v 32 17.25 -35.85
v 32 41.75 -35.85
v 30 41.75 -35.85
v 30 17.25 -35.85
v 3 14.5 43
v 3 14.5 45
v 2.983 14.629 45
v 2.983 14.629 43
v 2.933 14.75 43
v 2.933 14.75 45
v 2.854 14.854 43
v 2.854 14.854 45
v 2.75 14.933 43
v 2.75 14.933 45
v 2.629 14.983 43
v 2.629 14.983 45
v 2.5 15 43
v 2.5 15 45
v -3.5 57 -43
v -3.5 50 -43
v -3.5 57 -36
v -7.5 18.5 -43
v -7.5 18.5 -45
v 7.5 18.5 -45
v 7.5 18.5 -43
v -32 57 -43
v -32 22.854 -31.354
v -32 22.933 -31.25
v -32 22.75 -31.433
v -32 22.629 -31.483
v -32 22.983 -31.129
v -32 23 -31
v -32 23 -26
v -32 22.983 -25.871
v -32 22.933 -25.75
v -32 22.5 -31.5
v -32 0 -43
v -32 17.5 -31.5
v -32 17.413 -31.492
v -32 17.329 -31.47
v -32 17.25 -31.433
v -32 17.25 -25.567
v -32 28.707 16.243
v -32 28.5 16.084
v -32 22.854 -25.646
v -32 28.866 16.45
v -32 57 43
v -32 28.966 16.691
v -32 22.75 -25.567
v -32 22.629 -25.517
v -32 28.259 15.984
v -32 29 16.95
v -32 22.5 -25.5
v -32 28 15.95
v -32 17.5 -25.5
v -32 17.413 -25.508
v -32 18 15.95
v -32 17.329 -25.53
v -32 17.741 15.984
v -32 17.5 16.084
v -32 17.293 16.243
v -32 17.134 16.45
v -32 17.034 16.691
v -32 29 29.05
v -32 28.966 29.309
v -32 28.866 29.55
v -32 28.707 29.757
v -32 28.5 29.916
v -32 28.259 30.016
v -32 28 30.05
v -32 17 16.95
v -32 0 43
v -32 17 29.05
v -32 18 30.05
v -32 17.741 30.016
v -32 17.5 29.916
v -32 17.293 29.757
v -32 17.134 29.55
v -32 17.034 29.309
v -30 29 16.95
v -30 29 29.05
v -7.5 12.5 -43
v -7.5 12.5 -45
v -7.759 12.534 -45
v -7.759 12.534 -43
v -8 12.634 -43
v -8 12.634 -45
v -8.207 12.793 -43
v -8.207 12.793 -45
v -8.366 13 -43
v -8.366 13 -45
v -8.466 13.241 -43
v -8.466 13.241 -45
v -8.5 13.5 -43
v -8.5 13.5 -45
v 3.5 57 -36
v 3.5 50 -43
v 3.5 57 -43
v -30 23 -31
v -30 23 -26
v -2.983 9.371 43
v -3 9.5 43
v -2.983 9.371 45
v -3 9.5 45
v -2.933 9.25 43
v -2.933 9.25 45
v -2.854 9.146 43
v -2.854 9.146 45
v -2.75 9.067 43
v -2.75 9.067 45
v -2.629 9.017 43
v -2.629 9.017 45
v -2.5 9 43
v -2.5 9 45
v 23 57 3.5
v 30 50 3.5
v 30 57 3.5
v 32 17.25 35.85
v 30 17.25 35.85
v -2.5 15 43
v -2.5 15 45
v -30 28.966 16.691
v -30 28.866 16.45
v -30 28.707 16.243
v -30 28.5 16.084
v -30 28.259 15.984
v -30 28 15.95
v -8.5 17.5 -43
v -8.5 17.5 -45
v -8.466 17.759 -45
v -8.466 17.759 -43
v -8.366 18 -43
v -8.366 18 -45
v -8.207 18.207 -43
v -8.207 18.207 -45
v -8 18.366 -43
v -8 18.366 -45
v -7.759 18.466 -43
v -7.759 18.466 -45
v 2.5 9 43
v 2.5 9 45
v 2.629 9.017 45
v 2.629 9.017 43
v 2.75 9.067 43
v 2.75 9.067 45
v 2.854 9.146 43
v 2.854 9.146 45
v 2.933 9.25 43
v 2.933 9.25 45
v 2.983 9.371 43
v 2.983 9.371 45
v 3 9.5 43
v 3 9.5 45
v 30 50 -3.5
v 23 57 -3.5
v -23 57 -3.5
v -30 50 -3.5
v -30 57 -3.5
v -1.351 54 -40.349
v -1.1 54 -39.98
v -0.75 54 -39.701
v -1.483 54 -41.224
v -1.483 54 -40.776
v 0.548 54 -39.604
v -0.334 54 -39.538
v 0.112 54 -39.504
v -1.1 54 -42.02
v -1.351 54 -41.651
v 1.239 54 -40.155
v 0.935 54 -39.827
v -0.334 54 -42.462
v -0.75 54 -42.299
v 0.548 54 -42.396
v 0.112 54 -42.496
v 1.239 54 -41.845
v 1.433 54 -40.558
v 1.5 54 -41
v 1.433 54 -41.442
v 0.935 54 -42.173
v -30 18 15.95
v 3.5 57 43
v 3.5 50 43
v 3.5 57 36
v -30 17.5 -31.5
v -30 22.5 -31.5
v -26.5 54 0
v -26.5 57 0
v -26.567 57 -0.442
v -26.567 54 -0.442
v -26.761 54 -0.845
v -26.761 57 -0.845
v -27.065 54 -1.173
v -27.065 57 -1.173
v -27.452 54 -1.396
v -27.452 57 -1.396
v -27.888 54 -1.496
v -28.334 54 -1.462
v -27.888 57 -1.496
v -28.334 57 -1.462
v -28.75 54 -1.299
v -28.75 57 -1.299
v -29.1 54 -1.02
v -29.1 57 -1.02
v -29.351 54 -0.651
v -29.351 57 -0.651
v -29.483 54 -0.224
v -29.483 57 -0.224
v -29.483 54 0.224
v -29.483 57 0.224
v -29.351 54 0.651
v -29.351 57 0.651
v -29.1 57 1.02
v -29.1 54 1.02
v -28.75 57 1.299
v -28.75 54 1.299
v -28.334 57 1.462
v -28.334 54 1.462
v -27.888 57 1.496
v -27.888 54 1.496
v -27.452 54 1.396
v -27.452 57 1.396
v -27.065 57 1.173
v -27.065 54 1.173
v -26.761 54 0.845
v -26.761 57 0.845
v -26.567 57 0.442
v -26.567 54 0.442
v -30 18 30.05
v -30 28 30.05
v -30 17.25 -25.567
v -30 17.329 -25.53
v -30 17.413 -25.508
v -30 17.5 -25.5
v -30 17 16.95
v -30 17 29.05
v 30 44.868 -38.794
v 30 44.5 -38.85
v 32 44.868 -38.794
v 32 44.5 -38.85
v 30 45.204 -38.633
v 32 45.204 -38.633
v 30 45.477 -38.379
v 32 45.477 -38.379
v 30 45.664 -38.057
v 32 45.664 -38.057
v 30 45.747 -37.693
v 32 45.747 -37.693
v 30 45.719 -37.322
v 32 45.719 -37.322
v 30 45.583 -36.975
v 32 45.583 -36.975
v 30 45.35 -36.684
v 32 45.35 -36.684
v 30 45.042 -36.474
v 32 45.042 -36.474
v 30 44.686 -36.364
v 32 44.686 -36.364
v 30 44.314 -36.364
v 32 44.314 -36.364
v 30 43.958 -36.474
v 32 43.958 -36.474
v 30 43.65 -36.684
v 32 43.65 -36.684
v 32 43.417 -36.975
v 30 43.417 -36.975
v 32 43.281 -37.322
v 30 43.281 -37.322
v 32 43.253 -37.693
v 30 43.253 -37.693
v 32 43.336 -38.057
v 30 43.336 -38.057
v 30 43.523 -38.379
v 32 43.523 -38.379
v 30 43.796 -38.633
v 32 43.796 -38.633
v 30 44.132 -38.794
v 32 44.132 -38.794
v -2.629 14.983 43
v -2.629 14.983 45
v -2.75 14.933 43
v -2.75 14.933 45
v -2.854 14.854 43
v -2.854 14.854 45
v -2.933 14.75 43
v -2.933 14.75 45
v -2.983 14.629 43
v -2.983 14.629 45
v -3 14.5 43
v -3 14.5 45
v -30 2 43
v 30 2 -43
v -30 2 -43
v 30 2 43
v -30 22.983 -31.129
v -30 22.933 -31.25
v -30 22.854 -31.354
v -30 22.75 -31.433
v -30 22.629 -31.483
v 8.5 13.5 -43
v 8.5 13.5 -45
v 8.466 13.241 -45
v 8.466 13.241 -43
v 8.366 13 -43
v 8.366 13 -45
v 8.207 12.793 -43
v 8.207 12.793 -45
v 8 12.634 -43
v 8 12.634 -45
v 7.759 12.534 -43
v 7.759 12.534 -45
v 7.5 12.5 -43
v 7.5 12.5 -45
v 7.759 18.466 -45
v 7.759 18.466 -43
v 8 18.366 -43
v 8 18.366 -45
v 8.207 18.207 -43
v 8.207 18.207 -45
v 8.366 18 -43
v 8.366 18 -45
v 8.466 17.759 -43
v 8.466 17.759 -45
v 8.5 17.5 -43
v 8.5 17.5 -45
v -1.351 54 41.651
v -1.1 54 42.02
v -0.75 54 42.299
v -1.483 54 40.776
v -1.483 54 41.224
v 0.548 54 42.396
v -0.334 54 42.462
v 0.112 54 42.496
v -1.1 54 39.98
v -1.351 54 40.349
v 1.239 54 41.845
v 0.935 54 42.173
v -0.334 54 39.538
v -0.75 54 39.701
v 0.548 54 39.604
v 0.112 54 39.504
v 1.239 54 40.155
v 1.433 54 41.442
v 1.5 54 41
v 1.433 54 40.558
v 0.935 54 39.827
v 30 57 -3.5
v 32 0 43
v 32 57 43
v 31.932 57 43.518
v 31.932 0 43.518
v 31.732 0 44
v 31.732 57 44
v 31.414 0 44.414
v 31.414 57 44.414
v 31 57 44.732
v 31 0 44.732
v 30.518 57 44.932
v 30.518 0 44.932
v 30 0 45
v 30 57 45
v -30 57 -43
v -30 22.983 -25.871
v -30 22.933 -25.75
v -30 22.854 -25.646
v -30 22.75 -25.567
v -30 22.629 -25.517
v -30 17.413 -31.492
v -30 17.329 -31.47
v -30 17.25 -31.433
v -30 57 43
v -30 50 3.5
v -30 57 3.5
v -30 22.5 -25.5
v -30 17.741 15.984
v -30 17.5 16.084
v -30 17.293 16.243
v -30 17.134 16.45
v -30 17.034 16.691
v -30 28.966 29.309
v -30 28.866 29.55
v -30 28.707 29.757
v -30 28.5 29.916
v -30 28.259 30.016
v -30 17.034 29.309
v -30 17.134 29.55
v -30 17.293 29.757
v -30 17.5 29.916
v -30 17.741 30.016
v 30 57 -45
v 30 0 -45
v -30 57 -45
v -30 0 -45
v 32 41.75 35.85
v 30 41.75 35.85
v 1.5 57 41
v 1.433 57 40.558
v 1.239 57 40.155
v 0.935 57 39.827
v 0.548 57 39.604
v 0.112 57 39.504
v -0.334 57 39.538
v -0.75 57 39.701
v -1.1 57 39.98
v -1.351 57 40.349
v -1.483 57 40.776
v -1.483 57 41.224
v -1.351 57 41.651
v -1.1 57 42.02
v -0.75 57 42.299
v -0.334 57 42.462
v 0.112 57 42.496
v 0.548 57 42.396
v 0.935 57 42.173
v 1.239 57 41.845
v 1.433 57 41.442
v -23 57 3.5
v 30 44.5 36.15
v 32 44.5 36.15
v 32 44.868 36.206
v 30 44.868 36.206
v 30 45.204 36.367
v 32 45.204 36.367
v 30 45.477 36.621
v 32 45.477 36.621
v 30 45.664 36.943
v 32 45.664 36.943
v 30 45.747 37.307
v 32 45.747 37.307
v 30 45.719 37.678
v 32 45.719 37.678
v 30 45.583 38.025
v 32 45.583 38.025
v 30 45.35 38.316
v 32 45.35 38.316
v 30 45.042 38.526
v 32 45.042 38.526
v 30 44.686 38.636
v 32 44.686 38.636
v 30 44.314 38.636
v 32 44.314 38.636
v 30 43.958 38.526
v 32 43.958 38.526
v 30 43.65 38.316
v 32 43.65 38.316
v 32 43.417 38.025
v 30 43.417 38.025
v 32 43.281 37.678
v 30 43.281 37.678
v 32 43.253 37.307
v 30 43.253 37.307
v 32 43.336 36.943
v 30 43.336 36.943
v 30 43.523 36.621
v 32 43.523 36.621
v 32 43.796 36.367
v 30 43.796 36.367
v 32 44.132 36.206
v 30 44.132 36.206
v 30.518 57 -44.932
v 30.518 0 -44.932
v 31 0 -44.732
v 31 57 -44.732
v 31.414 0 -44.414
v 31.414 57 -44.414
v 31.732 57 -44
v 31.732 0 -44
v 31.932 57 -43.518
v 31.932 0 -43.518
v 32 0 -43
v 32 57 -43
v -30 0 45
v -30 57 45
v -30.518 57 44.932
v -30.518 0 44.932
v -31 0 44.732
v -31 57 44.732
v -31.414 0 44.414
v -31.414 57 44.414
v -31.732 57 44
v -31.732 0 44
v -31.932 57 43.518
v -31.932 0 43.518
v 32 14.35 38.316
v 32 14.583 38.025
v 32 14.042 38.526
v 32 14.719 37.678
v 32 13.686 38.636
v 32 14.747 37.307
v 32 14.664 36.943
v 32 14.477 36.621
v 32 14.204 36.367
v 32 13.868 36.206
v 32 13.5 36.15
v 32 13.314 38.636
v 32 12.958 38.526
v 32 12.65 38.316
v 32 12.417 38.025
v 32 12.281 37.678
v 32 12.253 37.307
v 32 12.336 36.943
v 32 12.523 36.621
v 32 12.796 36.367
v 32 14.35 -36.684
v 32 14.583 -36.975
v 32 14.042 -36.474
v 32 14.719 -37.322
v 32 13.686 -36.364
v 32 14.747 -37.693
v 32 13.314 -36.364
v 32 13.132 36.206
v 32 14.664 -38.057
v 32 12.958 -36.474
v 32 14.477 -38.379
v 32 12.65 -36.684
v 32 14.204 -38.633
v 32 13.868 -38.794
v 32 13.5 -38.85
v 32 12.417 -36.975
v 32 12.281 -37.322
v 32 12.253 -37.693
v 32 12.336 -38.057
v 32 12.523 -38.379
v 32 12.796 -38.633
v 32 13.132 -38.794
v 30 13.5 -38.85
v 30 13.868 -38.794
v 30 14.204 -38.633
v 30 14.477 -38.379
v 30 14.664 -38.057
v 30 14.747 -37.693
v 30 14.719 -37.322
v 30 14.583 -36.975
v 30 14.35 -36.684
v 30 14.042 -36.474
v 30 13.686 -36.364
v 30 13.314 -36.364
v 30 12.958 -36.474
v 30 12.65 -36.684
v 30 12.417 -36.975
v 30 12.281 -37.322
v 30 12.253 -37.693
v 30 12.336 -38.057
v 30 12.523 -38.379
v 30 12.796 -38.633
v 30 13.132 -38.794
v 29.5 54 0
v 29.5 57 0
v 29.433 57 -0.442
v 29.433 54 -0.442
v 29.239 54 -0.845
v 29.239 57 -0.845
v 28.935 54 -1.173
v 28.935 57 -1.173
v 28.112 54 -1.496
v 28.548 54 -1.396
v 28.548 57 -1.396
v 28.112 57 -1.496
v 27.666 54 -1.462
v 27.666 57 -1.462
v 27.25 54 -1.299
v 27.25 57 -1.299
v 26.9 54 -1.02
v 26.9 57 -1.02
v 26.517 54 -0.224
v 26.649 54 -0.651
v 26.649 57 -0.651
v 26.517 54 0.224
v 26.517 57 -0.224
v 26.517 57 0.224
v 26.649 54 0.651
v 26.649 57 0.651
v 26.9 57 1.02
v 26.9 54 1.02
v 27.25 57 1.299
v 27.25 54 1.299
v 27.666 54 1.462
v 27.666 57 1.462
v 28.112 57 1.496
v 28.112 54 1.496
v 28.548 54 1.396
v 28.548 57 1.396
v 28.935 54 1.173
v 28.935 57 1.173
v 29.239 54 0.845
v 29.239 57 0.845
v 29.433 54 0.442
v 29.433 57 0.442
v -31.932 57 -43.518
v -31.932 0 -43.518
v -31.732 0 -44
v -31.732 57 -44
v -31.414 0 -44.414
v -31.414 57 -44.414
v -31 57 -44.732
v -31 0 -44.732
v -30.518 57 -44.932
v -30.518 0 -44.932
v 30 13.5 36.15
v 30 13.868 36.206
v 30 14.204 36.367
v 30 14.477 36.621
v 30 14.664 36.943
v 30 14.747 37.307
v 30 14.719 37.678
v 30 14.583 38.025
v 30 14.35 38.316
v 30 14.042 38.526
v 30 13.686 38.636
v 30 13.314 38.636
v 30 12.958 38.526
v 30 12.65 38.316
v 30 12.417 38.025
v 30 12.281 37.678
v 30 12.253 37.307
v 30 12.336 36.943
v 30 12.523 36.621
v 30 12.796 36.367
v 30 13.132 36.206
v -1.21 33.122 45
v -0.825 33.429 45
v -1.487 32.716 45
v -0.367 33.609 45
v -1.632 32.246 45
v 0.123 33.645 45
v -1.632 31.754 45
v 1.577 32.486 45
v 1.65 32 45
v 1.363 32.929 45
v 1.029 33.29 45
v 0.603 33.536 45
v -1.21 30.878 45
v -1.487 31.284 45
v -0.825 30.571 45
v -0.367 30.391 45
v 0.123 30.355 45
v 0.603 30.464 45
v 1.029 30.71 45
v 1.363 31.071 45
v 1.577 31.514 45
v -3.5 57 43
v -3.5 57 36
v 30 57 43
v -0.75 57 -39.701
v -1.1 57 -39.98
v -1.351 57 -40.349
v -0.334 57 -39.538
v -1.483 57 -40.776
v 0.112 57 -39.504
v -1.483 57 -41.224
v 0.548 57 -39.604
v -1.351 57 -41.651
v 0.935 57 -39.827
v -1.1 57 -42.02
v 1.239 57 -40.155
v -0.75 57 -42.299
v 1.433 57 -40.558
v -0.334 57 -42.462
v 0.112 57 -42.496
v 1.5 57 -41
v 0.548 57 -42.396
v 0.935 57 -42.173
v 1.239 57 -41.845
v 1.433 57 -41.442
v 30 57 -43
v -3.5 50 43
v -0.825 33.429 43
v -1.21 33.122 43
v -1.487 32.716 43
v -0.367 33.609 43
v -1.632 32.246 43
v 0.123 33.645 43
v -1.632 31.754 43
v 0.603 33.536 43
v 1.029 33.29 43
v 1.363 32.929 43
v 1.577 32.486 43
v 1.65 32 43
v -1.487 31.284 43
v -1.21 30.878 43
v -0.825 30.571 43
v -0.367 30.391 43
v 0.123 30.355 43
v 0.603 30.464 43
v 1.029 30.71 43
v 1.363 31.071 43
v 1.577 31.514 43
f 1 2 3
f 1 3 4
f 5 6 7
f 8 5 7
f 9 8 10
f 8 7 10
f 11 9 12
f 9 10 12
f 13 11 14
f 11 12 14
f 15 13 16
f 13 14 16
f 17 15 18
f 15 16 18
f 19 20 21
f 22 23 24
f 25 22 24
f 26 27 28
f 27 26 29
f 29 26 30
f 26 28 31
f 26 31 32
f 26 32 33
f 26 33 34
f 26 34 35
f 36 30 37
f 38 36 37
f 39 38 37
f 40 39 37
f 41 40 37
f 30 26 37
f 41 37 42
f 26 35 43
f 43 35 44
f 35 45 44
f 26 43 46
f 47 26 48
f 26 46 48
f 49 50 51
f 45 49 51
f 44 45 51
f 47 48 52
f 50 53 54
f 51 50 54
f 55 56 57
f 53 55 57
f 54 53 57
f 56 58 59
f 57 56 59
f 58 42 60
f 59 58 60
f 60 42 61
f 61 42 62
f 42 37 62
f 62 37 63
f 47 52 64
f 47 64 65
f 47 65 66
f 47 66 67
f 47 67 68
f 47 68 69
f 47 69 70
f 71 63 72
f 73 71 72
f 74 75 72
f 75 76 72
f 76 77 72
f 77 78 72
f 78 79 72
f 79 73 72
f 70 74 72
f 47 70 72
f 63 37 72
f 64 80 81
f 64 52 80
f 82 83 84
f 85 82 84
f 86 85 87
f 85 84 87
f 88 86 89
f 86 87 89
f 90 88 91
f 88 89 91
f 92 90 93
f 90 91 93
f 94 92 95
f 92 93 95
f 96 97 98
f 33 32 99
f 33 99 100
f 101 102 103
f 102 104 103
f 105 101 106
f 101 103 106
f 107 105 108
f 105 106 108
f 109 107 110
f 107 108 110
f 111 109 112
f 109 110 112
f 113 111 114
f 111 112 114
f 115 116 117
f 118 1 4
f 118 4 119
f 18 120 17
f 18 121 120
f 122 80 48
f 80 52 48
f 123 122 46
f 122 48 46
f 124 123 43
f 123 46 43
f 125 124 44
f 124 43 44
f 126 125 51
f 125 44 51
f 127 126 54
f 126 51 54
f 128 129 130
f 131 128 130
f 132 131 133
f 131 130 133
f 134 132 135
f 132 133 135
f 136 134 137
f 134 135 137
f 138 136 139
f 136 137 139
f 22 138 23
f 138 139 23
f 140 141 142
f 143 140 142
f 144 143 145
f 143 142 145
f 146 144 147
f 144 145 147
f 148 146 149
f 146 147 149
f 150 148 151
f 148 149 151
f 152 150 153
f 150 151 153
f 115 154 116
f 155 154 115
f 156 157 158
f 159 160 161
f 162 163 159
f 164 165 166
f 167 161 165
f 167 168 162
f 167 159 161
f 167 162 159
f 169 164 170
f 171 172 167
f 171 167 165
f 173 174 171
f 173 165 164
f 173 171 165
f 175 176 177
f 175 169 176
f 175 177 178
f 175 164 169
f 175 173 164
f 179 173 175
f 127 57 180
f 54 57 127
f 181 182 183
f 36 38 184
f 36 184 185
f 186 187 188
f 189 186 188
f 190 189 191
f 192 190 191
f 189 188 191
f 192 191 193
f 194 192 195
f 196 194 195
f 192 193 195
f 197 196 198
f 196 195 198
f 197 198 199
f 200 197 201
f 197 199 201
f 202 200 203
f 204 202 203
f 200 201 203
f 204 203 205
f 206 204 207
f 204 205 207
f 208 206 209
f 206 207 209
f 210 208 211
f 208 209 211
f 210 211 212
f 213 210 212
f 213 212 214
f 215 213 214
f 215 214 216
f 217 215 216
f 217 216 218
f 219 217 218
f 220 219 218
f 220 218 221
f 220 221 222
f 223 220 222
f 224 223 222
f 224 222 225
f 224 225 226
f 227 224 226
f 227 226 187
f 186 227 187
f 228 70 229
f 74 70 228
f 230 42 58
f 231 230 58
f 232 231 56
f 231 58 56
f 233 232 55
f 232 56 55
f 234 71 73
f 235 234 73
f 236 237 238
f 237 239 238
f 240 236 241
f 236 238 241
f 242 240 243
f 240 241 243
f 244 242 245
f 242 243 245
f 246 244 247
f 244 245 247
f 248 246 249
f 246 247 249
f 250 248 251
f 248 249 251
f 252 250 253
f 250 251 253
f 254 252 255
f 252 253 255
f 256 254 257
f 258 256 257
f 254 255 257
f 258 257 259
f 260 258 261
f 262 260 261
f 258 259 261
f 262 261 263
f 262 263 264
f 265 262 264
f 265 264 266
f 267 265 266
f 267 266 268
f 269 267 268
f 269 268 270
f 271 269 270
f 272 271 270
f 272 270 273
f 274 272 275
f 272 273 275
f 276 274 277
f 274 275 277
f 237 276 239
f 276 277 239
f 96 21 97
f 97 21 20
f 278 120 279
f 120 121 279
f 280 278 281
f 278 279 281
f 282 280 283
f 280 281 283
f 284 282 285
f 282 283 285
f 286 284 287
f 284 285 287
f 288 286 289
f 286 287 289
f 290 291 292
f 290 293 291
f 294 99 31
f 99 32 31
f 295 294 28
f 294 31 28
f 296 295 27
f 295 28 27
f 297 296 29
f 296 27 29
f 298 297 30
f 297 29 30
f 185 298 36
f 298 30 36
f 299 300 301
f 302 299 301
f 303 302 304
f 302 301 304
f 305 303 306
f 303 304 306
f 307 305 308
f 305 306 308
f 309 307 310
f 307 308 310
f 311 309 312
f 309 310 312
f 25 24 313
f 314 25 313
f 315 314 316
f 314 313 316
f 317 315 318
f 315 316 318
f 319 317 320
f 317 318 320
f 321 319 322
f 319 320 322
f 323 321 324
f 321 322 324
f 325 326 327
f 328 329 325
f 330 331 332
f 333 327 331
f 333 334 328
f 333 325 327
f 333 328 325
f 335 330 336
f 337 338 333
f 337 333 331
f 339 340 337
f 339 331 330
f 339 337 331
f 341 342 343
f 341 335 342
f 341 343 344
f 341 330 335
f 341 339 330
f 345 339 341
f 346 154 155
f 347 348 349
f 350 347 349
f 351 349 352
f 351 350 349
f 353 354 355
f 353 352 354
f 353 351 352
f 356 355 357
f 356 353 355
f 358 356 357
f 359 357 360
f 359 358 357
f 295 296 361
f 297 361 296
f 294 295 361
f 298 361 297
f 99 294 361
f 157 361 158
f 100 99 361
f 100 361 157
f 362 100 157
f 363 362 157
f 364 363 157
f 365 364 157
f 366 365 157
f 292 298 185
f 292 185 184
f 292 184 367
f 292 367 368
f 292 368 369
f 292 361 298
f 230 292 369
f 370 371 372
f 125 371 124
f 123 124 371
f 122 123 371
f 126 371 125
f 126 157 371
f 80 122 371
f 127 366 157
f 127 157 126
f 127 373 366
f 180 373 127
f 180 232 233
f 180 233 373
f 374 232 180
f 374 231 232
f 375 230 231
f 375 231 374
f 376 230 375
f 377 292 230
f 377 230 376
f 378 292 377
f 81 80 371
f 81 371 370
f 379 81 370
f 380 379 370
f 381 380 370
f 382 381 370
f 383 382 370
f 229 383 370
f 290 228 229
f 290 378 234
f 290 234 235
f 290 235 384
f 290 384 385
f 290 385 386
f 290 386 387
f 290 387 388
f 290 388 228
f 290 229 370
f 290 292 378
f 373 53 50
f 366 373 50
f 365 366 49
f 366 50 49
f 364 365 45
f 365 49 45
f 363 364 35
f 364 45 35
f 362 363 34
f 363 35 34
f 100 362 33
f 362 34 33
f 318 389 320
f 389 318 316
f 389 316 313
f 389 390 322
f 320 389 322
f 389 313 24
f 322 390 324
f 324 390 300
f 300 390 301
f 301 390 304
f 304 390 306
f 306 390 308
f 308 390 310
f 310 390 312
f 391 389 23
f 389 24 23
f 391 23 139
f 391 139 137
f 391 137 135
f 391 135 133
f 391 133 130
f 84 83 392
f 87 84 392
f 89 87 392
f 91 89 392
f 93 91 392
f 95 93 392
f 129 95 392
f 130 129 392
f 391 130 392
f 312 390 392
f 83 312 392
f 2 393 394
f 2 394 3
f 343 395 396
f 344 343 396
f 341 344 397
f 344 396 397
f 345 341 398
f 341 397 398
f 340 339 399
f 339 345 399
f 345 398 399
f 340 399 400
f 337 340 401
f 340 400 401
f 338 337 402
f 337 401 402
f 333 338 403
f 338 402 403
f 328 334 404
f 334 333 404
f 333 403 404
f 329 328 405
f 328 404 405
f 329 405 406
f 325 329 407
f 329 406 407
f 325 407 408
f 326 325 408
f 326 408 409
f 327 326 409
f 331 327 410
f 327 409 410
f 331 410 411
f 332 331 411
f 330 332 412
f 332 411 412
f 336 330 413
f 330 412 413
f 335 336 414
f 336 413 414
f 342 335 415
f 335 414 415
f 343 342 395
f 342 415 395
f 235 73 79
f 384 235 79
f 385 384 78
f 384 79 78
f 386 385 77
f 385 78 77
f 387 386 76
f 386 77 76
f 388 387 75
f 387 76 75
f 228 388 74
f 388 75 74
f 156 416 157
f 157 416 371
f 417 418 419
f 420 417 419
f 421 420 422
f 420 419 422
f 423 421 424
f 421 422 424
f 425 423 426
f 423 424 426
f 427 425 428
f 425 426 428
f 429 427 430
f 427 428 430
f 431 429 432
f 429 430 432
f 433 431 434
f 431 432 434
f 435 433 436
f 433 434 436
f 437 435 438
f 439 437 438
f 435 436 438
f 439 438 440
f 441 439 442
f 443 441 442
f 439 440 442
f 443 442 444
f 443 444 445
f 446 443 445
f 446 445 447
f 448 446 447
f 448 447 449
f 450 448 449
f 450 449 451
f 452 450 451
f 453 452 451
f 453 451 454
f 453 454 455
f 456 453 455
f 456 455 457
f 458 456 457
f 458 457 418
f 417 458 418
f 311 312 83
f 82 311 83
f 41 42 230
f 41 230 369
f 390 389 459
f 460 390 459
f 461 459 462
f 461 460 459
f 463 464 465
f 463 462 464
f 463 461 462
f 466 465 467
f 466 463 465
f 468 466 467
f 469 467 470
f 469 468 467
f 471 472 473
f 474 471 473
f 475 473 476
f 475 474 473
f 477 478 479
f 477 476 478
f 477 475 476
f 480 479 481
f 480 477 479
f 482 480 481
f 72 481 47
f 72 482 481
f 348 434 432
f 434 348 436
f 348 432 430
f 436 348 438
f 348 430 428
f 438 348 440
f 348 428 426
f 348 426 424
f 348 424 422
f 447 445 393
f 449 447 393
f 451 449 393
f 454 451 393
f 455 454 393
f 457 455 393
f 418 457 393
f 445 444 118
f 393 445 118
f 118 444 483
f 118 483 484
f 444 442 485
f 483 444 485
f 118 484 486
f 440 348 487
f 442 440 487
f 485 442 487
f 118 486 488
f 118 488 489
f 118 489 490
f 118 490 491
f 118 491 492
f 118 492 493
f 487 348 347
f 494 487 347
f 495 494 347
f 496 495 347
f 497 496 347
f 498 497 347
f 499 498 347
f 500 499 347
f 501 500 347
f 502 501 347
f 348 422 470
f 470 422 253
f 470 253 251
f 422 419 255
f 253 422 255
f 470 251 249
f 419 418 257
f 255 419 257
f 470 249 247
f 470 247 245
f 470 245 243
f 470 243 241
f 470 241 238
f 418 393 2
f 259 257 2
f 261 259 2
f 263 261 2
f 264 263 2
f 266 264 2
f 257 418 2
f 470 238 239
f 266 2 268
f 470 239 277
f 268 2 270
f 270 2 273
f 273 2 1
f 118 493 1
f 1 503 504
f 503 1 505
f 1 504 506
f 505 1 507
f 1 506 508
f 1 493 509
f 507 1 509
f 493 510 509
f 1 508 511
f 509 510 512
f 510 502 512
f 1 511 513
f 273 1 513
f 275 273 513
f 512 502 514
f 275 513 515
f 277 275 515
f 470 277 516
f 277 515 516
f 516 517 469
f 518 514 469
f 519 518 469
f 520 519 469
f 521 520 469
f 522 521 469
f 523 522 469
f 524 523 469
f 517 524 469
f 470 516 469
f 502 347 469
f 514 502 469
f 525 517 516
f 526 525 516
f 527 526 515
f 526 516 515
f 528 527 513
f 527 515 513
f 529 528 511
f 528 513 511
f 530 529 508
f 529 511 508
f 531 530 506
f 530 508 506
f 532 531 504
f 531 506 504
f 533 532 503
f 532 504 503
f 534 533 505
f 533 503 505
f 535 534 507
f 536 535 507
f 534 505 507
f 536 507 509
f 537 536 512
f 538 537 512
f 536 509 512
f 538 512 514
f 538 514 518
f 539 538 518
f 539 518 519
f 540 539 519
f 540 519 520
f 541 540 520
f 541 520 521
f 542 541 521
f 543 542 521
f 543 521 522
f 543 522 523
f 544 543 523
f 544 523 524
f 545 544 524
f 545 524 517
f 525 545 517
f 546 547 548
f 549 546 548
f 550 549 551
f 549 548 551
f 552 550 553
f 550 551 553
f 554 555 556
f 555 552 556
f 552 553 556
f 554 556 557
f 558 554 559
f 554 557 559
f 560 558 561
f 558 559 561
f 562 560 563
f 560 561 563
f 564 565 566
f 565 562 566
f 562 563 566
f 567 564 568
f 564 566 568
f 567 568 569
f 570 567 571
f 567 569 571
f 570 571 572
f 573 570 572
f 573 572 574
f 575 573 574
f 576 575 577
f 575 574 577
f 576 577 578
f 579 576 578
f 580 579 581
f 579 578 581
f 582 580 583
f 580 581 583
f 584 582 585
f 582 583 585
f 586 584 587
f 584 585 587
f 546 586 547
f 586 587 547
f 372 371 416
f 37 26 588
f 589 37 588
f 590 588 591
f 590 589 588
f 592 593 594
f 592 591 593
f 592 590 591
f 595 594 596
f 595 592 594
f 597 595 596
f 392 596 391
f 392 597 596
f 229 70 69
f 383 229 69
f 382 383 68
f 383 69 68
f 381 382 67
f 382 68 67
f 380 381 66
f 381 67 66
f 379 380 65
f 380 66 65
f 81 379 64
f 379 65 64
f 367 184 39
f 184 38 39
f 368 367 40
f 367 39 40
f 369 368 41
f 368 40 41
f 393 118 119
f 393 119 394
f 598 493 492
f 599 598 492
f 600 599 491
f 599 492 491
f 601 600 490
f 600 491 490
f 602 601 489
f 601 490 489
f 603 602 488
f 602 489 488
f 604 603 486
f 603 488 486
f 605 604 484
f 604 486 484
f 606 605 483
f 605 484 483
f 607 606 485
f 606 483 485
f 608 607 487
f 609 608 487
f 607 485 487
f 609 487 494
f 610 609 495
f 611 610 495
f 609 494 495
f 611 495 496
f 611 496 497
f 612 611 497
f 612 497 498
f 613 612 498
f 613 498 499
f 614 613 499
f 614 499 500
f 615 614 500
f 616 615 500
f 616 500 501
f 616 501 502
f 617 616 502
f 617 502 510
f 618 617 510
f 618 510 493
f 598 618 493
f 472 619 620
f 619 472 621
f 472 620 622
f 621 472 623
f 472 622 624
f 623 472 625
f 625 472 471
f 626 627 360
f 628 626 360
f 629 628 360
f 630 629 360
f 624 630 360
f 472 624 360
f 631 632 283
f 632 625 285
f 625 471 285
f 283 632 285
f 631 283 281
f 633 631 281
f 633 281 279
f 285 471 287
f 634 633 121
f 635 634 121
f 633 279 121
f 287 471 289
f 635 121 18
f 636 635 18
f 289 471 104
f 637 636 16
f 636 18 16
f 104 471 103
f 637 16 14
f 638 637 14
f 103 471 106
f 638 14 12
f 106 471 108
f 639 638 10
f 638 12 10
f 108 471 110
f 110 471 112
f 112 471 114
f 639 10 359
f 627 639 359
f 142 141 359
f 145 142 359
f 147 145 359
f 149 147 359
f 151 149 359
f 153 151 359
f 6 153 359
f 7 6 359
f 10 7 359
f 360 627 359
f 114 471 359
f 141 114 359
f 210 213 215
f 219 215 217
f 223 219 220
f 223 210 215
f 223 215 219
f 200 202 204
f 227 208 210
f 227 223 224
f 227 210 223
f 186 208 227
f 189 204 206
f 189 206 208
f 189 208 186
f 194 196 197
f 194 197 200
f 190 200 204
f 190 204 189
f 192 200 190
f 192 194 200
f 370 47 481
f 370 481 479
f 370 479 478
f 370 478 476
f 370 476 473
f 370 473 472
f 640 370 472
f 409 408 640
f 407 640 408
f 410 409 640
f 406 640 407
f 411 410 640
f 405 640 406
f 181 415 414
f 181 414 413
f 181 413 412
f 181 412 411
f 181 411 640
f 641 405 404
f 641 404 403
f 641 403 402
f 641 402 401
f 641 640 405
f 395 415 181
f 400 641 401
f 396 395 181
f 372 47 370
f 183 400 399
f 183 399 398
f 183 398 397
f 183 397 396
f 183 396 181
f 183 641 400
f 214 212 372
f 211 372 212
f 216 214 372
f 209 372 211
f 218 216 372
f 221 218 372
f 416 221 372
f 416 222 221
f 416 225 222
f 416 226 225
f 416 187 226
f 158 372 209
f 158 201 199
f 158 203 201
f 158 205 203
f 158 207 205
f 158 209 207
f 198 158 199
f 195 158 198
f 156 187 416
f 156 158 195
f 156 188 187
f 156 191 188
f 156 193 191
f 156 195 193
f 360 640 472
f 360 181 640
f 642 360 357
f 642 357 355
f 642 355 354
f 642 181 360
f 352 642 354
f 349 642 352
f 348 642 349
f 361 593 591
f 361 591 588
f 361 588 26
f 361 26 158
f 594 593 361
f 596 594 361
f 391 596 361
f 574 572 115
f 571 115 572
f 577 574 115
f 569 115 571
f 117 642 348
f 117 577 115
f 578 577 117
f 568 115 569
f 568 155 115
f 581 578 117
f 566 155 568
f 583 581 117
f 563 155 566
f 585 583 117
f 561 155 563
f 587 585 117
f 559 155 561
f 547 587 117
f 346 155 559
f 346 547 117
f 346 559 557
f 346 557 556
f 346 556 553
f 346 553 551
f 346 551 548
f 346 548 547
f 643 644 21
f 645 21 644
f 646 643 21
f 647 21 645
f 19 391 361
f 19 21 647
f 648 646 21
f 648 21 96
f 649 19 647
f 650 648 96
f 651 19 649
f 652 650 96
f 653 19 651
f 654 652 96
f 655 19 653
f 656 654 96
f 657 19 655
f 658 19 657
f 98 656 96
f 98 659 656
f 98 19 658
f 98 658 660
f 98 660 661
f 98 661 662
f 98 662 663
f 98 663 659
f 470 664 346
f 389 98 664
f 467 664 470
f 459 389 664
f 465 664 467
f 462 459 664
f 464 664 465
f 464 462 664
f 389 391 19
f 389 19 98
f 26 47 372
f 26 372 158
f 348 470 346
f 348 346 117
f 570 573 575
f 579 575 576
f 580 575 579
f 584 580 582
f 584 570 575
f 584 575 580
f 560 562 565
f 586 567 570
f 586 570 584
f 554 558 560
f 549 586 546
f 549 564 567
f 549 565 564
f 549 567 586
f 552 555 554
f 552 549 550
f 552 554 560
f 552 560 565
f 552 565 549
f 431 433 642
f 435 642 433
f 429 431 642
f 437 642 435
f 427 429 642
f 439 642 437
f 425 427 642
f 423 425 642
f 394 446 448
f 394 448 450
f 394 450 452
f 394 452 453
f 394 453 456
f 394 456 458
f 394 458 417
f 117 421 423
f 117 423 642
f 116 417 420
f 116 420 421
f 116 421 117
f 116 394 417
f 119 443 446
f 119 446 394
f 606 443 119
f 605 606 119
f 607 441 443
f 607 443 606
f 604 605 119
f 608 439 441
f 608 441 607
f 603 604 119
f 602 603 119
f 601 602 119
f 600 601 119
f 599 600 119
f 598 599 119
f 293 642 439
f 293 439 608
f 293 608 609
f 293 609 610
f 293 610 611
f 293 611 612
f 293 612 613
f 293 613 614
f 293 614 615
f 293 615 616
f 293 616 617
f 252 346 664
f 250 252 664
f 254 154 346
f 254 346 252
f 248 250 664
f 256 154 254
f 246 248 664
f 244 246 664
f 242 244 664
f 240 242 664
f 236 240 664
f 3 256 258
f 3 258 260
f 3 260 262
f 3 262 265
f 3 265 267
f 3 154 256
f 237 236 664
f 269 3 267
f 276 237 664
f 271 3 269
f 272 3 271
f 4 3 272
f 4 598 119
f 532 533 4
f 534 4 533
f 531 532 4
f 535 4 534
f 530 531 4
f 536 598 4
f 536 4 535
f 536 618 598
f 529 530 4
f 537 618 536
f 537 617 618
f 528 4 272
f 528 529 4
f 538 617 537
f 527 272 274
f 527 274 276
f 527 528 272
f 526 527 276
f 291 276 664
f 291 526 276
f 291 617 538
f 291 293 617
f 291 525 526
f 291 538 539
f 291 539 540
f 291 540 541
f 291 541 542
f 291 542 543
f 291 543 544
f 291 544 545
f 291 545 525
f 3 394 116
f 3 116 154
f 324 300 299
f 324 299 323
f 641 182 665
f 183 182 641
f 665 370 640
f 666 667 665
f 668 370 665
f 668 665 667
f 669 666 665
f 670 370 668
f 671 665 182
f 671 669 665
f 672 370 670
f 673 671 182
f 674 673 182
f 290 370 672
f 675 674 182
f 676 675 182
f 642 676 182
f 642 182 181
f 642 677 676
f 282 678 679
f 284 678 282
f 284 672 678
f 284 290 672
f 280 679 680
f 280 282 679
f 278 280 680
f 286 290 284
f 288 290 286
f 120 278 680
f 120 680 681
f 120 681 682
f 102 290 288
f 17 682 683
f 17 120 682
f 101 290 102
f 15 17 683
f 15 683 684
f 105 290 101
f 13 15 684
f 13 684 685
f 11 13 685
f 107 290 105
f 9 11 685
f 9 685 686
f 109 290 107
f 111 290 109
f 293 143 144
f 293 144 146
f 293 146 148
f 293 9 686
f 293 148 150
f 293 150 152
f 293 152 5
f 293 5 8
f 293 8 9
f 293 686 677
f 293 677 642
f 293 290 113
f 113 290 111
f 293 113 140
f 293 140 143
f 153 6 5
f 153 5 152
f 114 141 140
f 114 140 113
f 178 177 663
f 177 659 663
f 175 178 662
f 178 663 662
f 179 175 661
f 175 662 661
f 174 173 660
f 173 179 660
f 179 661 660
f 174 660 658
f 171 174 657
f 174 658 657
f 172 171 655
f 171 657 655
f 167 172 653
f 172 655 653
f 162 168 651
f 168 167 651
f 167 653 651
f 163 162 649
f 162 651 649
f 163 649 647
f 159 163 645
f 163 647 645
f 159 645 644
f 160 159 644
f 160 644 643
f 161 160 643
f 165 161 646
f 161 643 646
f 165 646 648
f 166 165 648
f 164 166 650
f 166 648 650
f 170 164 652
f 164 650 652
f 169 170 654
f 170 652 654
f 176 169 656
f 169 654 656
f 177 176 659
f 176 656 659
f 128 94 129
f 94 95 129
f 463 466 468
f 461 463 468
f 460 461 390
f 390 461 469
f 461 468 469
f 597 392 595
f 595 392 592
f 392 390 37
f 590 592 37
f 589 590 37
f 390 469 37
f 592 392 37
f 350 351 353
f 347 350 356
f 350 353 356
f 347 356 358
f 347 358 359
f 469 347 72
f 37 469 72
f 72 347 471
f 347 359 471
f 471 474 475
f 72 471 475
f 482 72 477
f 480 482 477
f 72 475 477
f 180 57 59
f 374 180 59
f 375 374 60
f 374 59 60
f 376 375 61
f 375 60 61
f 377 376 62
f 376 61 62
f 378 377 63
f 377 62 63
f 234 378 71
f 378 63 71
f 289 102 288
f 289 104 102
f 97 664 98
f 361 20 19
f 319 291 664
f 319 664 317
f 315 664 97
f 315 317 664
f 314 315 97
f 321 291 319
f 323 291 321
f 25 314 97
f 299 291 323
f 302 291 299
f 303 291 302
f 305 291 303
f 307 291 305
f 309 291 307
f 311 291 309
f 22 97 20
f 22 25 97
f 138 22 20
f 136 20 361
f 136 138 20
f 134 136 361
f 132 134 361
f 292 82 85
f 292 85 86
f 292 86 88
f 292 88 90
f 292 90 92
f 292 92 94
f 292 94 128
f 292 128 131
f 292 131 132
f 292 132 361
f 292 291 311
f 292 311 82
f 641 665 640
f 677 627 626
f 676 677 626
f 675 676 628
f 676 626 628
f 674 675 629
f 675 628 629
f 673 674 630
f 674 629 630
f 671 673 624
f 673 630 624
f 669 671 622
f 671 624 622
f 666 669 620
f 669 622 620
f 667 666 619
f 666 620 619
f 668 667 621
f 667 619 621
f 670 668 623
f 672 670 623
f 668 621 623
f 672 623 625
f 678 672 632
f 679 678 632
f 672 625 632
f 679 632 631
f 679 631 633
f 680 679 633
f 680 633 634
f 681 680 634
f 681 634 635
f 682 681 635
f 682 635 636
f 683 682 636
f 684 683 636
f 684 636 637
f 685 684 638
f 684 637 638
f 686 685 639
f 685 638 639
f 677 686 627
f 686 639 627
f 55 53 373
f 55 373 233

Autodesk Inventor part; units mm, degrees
ref_plane "YZ Plane" through (0, 0, 0) normal (1, 0, 0) x (0, 1, 0)
ref_plane "XZ Plane" through (0, 0, 0) normal (0, 1, 0) x (-1, 0, 0)
ref_plane "XY Plane" through (0, 0, 0) normal (0, 0, 1) x (1, 0, 0)
sketch "Sketch1" plane through (0, 0, 0) normal (0, 1, 0) x (-1, 0, 0)
  line L0 (-30, -43) -> (30, -43)
  line L1 (30, -43) -> (30, 43)
  line L2 (30, 43) -> (-30, 43)
  line L3 (-30, 43) -> (-30, -43)
  line L4 (-30, -43) -> (30, 43) construction
  line L5 (30, -43) -> (-30, 43) construction
  line L6 (0, 43) -> (0, 45)
  line L7 (30, 0) -> (32, 0)
  line L8 (-30, -45) -> (30, -45)
  line L9 (32, -43) -> (32, 43)
  line L10 (30, 45) -> (-30, 45)
  line L11 (-32, 43) -> (-32, -43)
  line L12 (-32, -45) -> (32, 45) construction
  line L13 (32, -45) -> (-32, 45) construction
  arc A0 (-32, -43) -> (-30, -45) centre (-30, -43) ccw
  arc A1 (30, -45) -> (32, -43) centre (30, -43) ccw
  arc A2 (32, 43) -> (30, 45) centre (30, 43) ccw
  arc A3 (-30, 45) -> (-32, 43) centre (-30, 43) ccw
  point P0 (0, 0)
  dimension "d0" = 60
  dimension "d1" = 86
  dimension "d3" = 2
  dimension "d4" = 2
  dimension "d26" = 2
extrude "Extrusion1" add sketch "Sketch1" along normal blind 2
sketch "Sketch2" plane through (0, 2, 0) normal (0, 1, 0) x (1, 0, 0)
  line L0 (-30, -43) -> (30, -43)
  line L1 (30, -43) -> (30, 43)
  line L2 (30, 43) -> (-30, 43)
  line L3 (-30, 43) -> (-30, -43)
  line L4 (-30, -43) -> (30, 43) construction
  line L5 (30, -43) -> (-30, 43) construction
  line L6 (0, 43) -> (0, 45)
  line L7 (30, 0) -> (32, 0)
  line L8 (-30, -45) -> (30, -45)
  line L9 (32, -43) -> (32, 43)
  line L10 (30, 45) -> (-30, 45)
  line L11 (-32, 43) -> (-32, -43)
  line L12 (-32, -45) -> (32, 45) construction
  line L13 (32, -45) -> (-32, 45) construction
  arc A0 (32, 43) -> (30, 45) centre (30, 43) ccw
  arc A1 (-30, 45) -> (-32, 43) centre (-30, 43) ccw
  arc A2 (-32, -43) -> (-30, -45) centre (-30, -43) ccw
  arc A3 (30, -45) -> (32, -43) centre (30, -43) ccw
  point P0 (0, 0)
  point P1 (0, 0)
  dimension "d7" = 60
  dimension "d8" = 86
  dimension "d9" = 2
  dimension "d10" = 2
  dimension "d27" = 2
extrude "Extrusion2" add sketch "Sketch2" along normal blind 55 contours L0 L1 L7 L9 A3 L8 A2 L11 A1 L10 L6 L2 L3 | L1 L2 L6 L10 A0 L9 L7
sketch "Sketch3" plane through (32, 0, 45) normal (1, 0, 0) x (0, 0, -1)
  line L0 (2, 57) -> (88, 57) projected
  line L1 (2, 0) -> (88, 0) projected
  line L2 (107.729, 73.7861) -> (177.229, 73.7861)
  line L3 (106.879, 66.2861) -> (106.879, 57.2861)
  line L4 (106.879, 66.2861) -> (106.879, 72.9361)
  line L5 (106.879, 50.6361) -> (106.879, 57.2861)
  line L6 (177.229, 49.7861) -> (107.729, 49.7861)
  line L7 (178.079, 72.9361) -> (178.079, 50.6361)
  line L8 (142.479, 73.7861) -> (142.479, 49.7861)
  line L9 (178.079, 49.7861) -> (106.879, 49.7861)
  line L10 (106.879, 49.7861) -> (106.879, 73.7861)
  line L11 (106.879, 73.7861) -> (178.079, 73.7861)
  line L12 (178.079, 73.7861) -> (178.079, 49.7861)
  line L13 (178.079, 49.7861) -> (106.879, 73.7861) construction
  line L14 (106.879, 49.7861) -> (178.079, 73.7861) construction
  line L15 (177.069, 73.2861) -> (107.389, 73.2861)
  line L16 (82.6, 47) -> (52.1, 47)
  line L17 (7.6, 11) -> (82.6, 11)
  line L18 (7.6, 11) -> (82.6, 11)
  circle A0 centre (7.6, 44.5) radius 1.25
  line L19 (5.1, 44.5) -> (5.1, 13.5)
  line L20 (7.6, 11) -> (82.6, 11)
  line L21 (5.1, 11) -> (7.6, 11)
  circle A1 centre (7.6, 13.5) radius 1.25
  line L22 (5.1, 13.5) -> (5.1, 11)
  line L23 (82.6, 11) -> (85.1, 11)
  circle A2 centre (82.6, 13.5) radius 1.25
  circle A3 centre (82.6, 44.5) radius 1.25
  line L24 (85.1, 47) -> (82.6, 47)
  circle A4 centre (7.6, 44.5) radius 1.25
  line L25 (85.1, 47) -> (85.1, 11)
  line L26 (52.1, 47) -> (5.1, 47)
  line L27 (5.1, 47) -> (5.1, 44.5)
  line L28 (80.85, 17.25) -> (9.15, 17.25)
  line L29 (9.15, 17.25) -> (9.15, 41.75)
  line L30 (9.15, 41.75) -> (80.85, 41.75)
  line L31 (80.85, 41.75) -> (80.85, 17.25)
  line L32 (80.85, 17.25) -> (9.15, 41.75) construction
  line L33 (9.15, 17.25) -> (80.85, 41.75) construction
  point P0 (45, 0)
  point P1 (0, 57)
  point P2 (90, 57)
  point P3 (0, 0)
  point P4 (90, 0)
  point P5 (142.479, 61.7861)
  point P6 (45, 29.5)
  dimension "d21" = 71.7
  dimension "d22" = 24.5
  dimension "d100" = 2.5
extrude "Extrusion3" cut sketch "Sketch3" against normal blind 10 contours A0 | A1 | A2 | A3 | L28 L29 L30 L31
sketch "Sketch4" plane through (32, 0, -45) normal (0, 0, -1) x (-1, 0, 0)
  line L0 (32, 0) -> (32, 12.5)
  line L1 (32, 12.5) -> (39.5, 12.5)
  line L2 (40.5, 13.5) -> (40.5, 17.5)
  line L3 (39.5, 18.5) -> (32, 18.5)
  line L4 (32, 18.5) -> (32, 12.5)
  line L5 (32, 12.5) -> (24.5, 12.5)
  line L6 (23.5, 13.5) -> (23.5, 17.5)
  line L7 (24.5, 18.5) -> (32, 18.5)
  arc A0 (24.5, 18.5) -> (23.5, 17.5) centre (24.5, 17.5) ccw
  arc A1 (23.5, 13.5) -> (24.5, 12.5) centre (24.5, 13.5) ccw
  arc A2 (39.5, 12.5) -> (40.5, 13.5) centre (39.5, 13.5) ccw
  arc A3 (40.5, 17.5) -> (39.5, 18.5) centre (39.5, 17.5) ccw
  point P0 (40.5, 18.5)
  point P1 (40.5, 12.5)
  point P2 (23.5, 18.5)
  point P3 (23.5, 12.5)
  dimension "d23" = 12.5
  dimension "d24" = 8.5
  dimension "d25" = 6
  dimension "d28" = 1
extrude "Extrusion4" cut sketch "Sketch4" against normal blind 10
sketch "Sketch5" plane through (-32, 0, -43) normal (-1, 0, 0) x (0, 0, 1)
  line L0 (0, 2) -> (86, 2) projected
  line L1 (86, 2) -> (66, 2)
  line L2 (66, 17) -> (72.05, 17)
  line L3 (66, 17) -> (59.95, 17)
  line L4 (58.95, 18) -> (58.95, 28)
  line L5 (59.95, 29) -> (72.05, 29)
  line L6 (73.05, 28) -> (73.05, 18)
  arc A0 (59.95, 29) -> (58.95, 28) centre (59.95, 28) ccw
  arc A1 (73.05, 28) -> (72.05, 29) centre (72.05, 28) ccw
  arc A2 (58.95, 18) -> (59.95, 17) centre (59.95, 18) ccw
  arc A3 (72.05, 17) -> (73.05, 18) centre (72.05, 18) ccw
  line L7 (66, 29) -> (66, 17)
  line L8 (66, 23) -> (58.95, 23)
  line L9 (78.85, 17.25) -> (7.15, 17.25) projected
  line L10 (66, 17) -> (67, 17) construction
  line L11 (15, 17) -> (16, 17)
  line L12 (17, 17) -> (12, 17)
  line L13 (11.5, 17.5) -> (11.5, 22.5)
  line L14 (12, 23) -> (17, 23)
  line L15 (17.5, 22.5) -> (17.5, 17.5)
  arc A4 (11.5, 17.5) -> (12, 17) centre (12, 17.5) ccw
  arc A5 (17, 17) -> (17.5, 17.5) centre (17, 17.5) ccw
  arc A6 (12, 23) -> (11.5, 22.5) centre (12, 22.5) ccw
  arc A7 (17.5, 22.5) -> (17, 23) centre (17, 22.5) ccw
  point P0 (43, 0)
  point P1 (73.05, 17)
  point P2 (58.95, 17)
  point P3 (58.95, 29)
  point P4 (14.5, 20)
  point P5 (17.5, 20)
  point P6 (11.5, 23)
  point P7 (11.5, 17)
  point P8 (17.5, 23)
  point P9 (11.567, 17.25)
  point P10 (17.433, 17.25)
  dimension "d31" = 20
  dimension "d32" = 15
  dimension "d33" = 7.05
  dimension "d34" = 12
  dimension "d35" = 1
  dimension "d83" = 50
  dimension "d89" = 6
  dimension "d90" = 6
  dimension "d91" = 0.5
extrude "Extrusion5" cut sketch "Sketch5" against normal blind 10 contours L7 L9 A3 L2 | L9 A4 L13 A6 L14 A7 L15 A5 | L3 A2 L9 L7 | L9 A2 L4 L8 L7 | L7 L5 A1 L6 A3 L9 | L8 L4 A0 L5 L7
sketch "Sketch6" plane through (-30, 2, 43) normal (1, 0, 0) x (0, 0, -1)
  line L0 (0, 55) -> (86, 55) projected
  line L1 (43, 55) -> (43, 48)
  line L2 (43, 48) -> (39.5, 48)
  line L3 (39.5, 48) -> (39.5, 55)
  line L4 (43, 48) -> (46.5, 48)
  line L5 (46.5, 48) -> (46.5, 55)
  point P0 (43, -2)
  dimension "d38" = 7
  dimension "d39" = 3.5
extrude "Extrusion6" add sketch "Sketch6" along normal blind 7
sketch "Sketch8" plane through (-30, 50, 3.5) normal (0, 0, 1) x (1, 0, 0)
  line L0 (7, 7) -> (7, 0) projected
  line L1 (0, 0) -> (7, 0) projected
  line L2 (0, 0) -> (0, 7) projected
  line L3 (0, 7) -> (7, 7) projected
  line L4 (7, 7) -> (0, 0)
  point P0 (30, -50)
extrude "Extrusion7" cut sketch "Sketch8" against normal blind 7 contours L0 L1 L4
sketch "Sketch9" plane through (0, 57, 0) normal (0, 1, 0) x (1, 0, 0)
  line L0 (-30, 3.5) -> (-23, 3.5) projected
  line L1 (-30, -3.5) -> (-23, -3.5) projected
  line L2 (-23, 3.5) -> (-23, -3.5) projected
  line L3 (-30, 3.5) -> (-30, -3.5)
  line L4 (-30, 43) -> (-30, -43) projected
  line L5 (-23, 0) -> (-28, 0)
  circle A0 centre (-28, 0) radius 1.5
  point P0 (0, 0)
  dimension "d47" = 5
  dimension "d48" = 3
extrude "Extrusion8" cut sketch "Sketch9" against normal blind 3 contours A0
sketch "Sketch11" plane through (-30, 2, -43) normal (0, 0, 1) x (1, 0, 0)
  line L0 (0, 55) -> (60, 55) projected
  line L1 (30, 55) -> (30, 48)
  line L2 (30, 48) -> (33.5, 48)
  line L3 (33.5, 48) -> (33.5, 55)
  line L4 (30, 48) -> (26.5, 48)
  line L5 (26.5, 48) -> (26.5, 55)
  point P0 (30, -2)
  dimension "d49" = 7
  dimension "d50" = 3.5
  dimension "d51" = 3.5
extrude "Extrusion9" add sketch "Sketch11" along normal blind 7
sketch "Sketch12" plane through (-3.5, 50, -43) normal (-1, 0, 0) x (0, 0, 1)
  line L0 (7, 7) -> (7, 0) projected
  line L1 (0, 0) -> (7, 0) projected
  line L2 (7, 7) -> (0, 0)
  point P0 (43, -50)
extrude "Extrusion10" cut sketch "Sketch12" against normal blind 7
sketch "Sketch13" plane through (0, 57, 0) normal (0, 1, 0) x (1, 0, 0)
  line L0 (3.5, 36) -> (-3.5, 36) projected
  line L1 (0, 36) -> (0, 41)
  circle A0 centre (0, 41) radius 1.5
  point P0 (0, 0)
  dimension "d56" = 5
  dimension "d57" = 3
extrude "Extrusion11" cut sketch "Sketch13" against normal blind 3
sketch "Sketch14" plane through (30, 2, -43) normal (-1, 0, 0) x (0, 0, 1)
  line L0 (0, 55) -> (86, 55) projected
  line L1 (43, 55) -> (43, 48)
  line L2 (43, 48) -> (46.5, 48)
  line L3 (46.5, 48) -> (46.5, 55)
  line L4 (43, 48) -> (39.5, 48)
  line L5 (39.5, 48) -> (39.5, 55)
  point P0 (43, -2)
  dimension "d60" = 7
  dimension "d61" = 3.5
extrude "Extrusion12" add sketch "Sketch14" along normal blind 7
sketch "Sketch17" plane through (30, 50, -3.5) normal (0, 0, -1) x (-1, 0, 0)
  line L0 (7, 7) -> (7, 0) projected
  line L1 (0, 0) -> (7, 0) projected
  line L2 (0, 0) -> (7, 7)
  point P0 (30, -50)
extrude "Extrusion13" cut sketch "Sketch17" against normal blind 7
sketch "Sketch18" plane through (0, 57, 0) normal (0, 1, 0) x (1, 0, 0)
  line L0 (23, -3.5) -> (23, 3.5) projected
  line L1 (23, 0) -> (28, 0)
  circle A0 centre (28, 0) radius 1.5
  point P0 (0, 0)
  dimension "d66" = 5
  dimension "d67" = 3
extrude "Extrusion14" cut sketch "Sketch18" against normal blind 3
sketch "Sketch19" plane through (30, 2, 43) normal (0, 0, -1) x (-1, 0, 0)
  line L0 (0, 55) -> (60, 55) projected
  line L1 (30, 55) -> (30, 48)
  line L2 (30, 48) -> (33.5, 48)
  line L3 (33.5, 48) -> (33.5, 55)
  line L4 (30, 48) -> (26.5, 48)
  line L5 (26.5, 48) -> (26.5, 55)
  point P0 (30, -2)
  dimension "d70" = 7
  dimension "d71" = 3.5
extrude "Extrusion15" add sketch "Sketch19" along normal blind 7
sketch "Sketch20" plane through (3.5, 50, 43) normal (1, 0, 0) x (0, 0, -1)
  line L0 (7, 7) -> (7, 0) projected
  line L1 (0, 0) -> (7, 0) projected
  line L2 (0, 0) -> (7, 7)
  point P0 (43, -50)
extrude "Extrusion16" cut sketch "Sketch20" against normal blind 7
sketch "Sketch21" plane through (0, 57, 0) normal (0, 1, 0) x (1, 0, 0)
  line L0 (-3.5, -36) -> (3.5, -36) projected
  line L1 (-3.5, -43) -> (-3.5, -36) projected
  line L2 (3.5, -43) -> (3.5, -36) projected
  line L3 (0, -36) -> (0, -41)
  circle A0 centre (0, -41) radius 1.5
  point P0 (0, 0)
  dimension "d76" = 5
  dimension "d77" = 3
extrude "Extrusion17" cut sketch "Sketch21" against normal blind 3
sketch "Sketch23" plane through (-30, 0, 45) normal (0, 0, 1) x (1, 0, 0)
  line L0 (0, 2) -> (60, 2) projected
  line L1 (0, 57) -> (60, 57) projected
  line L2 (30, 2) -> (30, 12)
  circle A0 centre (30, 32) radius 1.65
  line L3 (32.5, 9) -> (27.5, 9)
  line L4 (27, 9.5) -> (27, 14.5)
  line L5 (27.5, 15) -> (32.5, 15)
  line L6 (33, 14.5) -> (33, 9.5)
  line L7 (33, 9) -> (27, 15) construction
  line L8 (27, 9) -> (33, 15) construction
  arc A1 (33, 14.5) -> (32.5, 15) centre (32.5, 14.5) ccw
  arc A2 (27.5, 15) -> (27, 14.5) centre (27.5, 14.5) ccw
  arc A3 (27, 9.5) -> (27.5, 9) centre (27.5, 9.5) ccw
  arc A4 (32.5, 9) -> (33, 9.5) centre (32.5, 9.5) ccw
  point P0 (30, 0)
  dimension "d92" = 10
  dimension "d94" = 3.3
  dimension "d95" = 6
  dimension "d96" = 6
  dimension "d97" = 0.5
extrude "Extrusion18" cut sketch "Sketch23" against normal blind 10
properties part number "Case Bottom"
